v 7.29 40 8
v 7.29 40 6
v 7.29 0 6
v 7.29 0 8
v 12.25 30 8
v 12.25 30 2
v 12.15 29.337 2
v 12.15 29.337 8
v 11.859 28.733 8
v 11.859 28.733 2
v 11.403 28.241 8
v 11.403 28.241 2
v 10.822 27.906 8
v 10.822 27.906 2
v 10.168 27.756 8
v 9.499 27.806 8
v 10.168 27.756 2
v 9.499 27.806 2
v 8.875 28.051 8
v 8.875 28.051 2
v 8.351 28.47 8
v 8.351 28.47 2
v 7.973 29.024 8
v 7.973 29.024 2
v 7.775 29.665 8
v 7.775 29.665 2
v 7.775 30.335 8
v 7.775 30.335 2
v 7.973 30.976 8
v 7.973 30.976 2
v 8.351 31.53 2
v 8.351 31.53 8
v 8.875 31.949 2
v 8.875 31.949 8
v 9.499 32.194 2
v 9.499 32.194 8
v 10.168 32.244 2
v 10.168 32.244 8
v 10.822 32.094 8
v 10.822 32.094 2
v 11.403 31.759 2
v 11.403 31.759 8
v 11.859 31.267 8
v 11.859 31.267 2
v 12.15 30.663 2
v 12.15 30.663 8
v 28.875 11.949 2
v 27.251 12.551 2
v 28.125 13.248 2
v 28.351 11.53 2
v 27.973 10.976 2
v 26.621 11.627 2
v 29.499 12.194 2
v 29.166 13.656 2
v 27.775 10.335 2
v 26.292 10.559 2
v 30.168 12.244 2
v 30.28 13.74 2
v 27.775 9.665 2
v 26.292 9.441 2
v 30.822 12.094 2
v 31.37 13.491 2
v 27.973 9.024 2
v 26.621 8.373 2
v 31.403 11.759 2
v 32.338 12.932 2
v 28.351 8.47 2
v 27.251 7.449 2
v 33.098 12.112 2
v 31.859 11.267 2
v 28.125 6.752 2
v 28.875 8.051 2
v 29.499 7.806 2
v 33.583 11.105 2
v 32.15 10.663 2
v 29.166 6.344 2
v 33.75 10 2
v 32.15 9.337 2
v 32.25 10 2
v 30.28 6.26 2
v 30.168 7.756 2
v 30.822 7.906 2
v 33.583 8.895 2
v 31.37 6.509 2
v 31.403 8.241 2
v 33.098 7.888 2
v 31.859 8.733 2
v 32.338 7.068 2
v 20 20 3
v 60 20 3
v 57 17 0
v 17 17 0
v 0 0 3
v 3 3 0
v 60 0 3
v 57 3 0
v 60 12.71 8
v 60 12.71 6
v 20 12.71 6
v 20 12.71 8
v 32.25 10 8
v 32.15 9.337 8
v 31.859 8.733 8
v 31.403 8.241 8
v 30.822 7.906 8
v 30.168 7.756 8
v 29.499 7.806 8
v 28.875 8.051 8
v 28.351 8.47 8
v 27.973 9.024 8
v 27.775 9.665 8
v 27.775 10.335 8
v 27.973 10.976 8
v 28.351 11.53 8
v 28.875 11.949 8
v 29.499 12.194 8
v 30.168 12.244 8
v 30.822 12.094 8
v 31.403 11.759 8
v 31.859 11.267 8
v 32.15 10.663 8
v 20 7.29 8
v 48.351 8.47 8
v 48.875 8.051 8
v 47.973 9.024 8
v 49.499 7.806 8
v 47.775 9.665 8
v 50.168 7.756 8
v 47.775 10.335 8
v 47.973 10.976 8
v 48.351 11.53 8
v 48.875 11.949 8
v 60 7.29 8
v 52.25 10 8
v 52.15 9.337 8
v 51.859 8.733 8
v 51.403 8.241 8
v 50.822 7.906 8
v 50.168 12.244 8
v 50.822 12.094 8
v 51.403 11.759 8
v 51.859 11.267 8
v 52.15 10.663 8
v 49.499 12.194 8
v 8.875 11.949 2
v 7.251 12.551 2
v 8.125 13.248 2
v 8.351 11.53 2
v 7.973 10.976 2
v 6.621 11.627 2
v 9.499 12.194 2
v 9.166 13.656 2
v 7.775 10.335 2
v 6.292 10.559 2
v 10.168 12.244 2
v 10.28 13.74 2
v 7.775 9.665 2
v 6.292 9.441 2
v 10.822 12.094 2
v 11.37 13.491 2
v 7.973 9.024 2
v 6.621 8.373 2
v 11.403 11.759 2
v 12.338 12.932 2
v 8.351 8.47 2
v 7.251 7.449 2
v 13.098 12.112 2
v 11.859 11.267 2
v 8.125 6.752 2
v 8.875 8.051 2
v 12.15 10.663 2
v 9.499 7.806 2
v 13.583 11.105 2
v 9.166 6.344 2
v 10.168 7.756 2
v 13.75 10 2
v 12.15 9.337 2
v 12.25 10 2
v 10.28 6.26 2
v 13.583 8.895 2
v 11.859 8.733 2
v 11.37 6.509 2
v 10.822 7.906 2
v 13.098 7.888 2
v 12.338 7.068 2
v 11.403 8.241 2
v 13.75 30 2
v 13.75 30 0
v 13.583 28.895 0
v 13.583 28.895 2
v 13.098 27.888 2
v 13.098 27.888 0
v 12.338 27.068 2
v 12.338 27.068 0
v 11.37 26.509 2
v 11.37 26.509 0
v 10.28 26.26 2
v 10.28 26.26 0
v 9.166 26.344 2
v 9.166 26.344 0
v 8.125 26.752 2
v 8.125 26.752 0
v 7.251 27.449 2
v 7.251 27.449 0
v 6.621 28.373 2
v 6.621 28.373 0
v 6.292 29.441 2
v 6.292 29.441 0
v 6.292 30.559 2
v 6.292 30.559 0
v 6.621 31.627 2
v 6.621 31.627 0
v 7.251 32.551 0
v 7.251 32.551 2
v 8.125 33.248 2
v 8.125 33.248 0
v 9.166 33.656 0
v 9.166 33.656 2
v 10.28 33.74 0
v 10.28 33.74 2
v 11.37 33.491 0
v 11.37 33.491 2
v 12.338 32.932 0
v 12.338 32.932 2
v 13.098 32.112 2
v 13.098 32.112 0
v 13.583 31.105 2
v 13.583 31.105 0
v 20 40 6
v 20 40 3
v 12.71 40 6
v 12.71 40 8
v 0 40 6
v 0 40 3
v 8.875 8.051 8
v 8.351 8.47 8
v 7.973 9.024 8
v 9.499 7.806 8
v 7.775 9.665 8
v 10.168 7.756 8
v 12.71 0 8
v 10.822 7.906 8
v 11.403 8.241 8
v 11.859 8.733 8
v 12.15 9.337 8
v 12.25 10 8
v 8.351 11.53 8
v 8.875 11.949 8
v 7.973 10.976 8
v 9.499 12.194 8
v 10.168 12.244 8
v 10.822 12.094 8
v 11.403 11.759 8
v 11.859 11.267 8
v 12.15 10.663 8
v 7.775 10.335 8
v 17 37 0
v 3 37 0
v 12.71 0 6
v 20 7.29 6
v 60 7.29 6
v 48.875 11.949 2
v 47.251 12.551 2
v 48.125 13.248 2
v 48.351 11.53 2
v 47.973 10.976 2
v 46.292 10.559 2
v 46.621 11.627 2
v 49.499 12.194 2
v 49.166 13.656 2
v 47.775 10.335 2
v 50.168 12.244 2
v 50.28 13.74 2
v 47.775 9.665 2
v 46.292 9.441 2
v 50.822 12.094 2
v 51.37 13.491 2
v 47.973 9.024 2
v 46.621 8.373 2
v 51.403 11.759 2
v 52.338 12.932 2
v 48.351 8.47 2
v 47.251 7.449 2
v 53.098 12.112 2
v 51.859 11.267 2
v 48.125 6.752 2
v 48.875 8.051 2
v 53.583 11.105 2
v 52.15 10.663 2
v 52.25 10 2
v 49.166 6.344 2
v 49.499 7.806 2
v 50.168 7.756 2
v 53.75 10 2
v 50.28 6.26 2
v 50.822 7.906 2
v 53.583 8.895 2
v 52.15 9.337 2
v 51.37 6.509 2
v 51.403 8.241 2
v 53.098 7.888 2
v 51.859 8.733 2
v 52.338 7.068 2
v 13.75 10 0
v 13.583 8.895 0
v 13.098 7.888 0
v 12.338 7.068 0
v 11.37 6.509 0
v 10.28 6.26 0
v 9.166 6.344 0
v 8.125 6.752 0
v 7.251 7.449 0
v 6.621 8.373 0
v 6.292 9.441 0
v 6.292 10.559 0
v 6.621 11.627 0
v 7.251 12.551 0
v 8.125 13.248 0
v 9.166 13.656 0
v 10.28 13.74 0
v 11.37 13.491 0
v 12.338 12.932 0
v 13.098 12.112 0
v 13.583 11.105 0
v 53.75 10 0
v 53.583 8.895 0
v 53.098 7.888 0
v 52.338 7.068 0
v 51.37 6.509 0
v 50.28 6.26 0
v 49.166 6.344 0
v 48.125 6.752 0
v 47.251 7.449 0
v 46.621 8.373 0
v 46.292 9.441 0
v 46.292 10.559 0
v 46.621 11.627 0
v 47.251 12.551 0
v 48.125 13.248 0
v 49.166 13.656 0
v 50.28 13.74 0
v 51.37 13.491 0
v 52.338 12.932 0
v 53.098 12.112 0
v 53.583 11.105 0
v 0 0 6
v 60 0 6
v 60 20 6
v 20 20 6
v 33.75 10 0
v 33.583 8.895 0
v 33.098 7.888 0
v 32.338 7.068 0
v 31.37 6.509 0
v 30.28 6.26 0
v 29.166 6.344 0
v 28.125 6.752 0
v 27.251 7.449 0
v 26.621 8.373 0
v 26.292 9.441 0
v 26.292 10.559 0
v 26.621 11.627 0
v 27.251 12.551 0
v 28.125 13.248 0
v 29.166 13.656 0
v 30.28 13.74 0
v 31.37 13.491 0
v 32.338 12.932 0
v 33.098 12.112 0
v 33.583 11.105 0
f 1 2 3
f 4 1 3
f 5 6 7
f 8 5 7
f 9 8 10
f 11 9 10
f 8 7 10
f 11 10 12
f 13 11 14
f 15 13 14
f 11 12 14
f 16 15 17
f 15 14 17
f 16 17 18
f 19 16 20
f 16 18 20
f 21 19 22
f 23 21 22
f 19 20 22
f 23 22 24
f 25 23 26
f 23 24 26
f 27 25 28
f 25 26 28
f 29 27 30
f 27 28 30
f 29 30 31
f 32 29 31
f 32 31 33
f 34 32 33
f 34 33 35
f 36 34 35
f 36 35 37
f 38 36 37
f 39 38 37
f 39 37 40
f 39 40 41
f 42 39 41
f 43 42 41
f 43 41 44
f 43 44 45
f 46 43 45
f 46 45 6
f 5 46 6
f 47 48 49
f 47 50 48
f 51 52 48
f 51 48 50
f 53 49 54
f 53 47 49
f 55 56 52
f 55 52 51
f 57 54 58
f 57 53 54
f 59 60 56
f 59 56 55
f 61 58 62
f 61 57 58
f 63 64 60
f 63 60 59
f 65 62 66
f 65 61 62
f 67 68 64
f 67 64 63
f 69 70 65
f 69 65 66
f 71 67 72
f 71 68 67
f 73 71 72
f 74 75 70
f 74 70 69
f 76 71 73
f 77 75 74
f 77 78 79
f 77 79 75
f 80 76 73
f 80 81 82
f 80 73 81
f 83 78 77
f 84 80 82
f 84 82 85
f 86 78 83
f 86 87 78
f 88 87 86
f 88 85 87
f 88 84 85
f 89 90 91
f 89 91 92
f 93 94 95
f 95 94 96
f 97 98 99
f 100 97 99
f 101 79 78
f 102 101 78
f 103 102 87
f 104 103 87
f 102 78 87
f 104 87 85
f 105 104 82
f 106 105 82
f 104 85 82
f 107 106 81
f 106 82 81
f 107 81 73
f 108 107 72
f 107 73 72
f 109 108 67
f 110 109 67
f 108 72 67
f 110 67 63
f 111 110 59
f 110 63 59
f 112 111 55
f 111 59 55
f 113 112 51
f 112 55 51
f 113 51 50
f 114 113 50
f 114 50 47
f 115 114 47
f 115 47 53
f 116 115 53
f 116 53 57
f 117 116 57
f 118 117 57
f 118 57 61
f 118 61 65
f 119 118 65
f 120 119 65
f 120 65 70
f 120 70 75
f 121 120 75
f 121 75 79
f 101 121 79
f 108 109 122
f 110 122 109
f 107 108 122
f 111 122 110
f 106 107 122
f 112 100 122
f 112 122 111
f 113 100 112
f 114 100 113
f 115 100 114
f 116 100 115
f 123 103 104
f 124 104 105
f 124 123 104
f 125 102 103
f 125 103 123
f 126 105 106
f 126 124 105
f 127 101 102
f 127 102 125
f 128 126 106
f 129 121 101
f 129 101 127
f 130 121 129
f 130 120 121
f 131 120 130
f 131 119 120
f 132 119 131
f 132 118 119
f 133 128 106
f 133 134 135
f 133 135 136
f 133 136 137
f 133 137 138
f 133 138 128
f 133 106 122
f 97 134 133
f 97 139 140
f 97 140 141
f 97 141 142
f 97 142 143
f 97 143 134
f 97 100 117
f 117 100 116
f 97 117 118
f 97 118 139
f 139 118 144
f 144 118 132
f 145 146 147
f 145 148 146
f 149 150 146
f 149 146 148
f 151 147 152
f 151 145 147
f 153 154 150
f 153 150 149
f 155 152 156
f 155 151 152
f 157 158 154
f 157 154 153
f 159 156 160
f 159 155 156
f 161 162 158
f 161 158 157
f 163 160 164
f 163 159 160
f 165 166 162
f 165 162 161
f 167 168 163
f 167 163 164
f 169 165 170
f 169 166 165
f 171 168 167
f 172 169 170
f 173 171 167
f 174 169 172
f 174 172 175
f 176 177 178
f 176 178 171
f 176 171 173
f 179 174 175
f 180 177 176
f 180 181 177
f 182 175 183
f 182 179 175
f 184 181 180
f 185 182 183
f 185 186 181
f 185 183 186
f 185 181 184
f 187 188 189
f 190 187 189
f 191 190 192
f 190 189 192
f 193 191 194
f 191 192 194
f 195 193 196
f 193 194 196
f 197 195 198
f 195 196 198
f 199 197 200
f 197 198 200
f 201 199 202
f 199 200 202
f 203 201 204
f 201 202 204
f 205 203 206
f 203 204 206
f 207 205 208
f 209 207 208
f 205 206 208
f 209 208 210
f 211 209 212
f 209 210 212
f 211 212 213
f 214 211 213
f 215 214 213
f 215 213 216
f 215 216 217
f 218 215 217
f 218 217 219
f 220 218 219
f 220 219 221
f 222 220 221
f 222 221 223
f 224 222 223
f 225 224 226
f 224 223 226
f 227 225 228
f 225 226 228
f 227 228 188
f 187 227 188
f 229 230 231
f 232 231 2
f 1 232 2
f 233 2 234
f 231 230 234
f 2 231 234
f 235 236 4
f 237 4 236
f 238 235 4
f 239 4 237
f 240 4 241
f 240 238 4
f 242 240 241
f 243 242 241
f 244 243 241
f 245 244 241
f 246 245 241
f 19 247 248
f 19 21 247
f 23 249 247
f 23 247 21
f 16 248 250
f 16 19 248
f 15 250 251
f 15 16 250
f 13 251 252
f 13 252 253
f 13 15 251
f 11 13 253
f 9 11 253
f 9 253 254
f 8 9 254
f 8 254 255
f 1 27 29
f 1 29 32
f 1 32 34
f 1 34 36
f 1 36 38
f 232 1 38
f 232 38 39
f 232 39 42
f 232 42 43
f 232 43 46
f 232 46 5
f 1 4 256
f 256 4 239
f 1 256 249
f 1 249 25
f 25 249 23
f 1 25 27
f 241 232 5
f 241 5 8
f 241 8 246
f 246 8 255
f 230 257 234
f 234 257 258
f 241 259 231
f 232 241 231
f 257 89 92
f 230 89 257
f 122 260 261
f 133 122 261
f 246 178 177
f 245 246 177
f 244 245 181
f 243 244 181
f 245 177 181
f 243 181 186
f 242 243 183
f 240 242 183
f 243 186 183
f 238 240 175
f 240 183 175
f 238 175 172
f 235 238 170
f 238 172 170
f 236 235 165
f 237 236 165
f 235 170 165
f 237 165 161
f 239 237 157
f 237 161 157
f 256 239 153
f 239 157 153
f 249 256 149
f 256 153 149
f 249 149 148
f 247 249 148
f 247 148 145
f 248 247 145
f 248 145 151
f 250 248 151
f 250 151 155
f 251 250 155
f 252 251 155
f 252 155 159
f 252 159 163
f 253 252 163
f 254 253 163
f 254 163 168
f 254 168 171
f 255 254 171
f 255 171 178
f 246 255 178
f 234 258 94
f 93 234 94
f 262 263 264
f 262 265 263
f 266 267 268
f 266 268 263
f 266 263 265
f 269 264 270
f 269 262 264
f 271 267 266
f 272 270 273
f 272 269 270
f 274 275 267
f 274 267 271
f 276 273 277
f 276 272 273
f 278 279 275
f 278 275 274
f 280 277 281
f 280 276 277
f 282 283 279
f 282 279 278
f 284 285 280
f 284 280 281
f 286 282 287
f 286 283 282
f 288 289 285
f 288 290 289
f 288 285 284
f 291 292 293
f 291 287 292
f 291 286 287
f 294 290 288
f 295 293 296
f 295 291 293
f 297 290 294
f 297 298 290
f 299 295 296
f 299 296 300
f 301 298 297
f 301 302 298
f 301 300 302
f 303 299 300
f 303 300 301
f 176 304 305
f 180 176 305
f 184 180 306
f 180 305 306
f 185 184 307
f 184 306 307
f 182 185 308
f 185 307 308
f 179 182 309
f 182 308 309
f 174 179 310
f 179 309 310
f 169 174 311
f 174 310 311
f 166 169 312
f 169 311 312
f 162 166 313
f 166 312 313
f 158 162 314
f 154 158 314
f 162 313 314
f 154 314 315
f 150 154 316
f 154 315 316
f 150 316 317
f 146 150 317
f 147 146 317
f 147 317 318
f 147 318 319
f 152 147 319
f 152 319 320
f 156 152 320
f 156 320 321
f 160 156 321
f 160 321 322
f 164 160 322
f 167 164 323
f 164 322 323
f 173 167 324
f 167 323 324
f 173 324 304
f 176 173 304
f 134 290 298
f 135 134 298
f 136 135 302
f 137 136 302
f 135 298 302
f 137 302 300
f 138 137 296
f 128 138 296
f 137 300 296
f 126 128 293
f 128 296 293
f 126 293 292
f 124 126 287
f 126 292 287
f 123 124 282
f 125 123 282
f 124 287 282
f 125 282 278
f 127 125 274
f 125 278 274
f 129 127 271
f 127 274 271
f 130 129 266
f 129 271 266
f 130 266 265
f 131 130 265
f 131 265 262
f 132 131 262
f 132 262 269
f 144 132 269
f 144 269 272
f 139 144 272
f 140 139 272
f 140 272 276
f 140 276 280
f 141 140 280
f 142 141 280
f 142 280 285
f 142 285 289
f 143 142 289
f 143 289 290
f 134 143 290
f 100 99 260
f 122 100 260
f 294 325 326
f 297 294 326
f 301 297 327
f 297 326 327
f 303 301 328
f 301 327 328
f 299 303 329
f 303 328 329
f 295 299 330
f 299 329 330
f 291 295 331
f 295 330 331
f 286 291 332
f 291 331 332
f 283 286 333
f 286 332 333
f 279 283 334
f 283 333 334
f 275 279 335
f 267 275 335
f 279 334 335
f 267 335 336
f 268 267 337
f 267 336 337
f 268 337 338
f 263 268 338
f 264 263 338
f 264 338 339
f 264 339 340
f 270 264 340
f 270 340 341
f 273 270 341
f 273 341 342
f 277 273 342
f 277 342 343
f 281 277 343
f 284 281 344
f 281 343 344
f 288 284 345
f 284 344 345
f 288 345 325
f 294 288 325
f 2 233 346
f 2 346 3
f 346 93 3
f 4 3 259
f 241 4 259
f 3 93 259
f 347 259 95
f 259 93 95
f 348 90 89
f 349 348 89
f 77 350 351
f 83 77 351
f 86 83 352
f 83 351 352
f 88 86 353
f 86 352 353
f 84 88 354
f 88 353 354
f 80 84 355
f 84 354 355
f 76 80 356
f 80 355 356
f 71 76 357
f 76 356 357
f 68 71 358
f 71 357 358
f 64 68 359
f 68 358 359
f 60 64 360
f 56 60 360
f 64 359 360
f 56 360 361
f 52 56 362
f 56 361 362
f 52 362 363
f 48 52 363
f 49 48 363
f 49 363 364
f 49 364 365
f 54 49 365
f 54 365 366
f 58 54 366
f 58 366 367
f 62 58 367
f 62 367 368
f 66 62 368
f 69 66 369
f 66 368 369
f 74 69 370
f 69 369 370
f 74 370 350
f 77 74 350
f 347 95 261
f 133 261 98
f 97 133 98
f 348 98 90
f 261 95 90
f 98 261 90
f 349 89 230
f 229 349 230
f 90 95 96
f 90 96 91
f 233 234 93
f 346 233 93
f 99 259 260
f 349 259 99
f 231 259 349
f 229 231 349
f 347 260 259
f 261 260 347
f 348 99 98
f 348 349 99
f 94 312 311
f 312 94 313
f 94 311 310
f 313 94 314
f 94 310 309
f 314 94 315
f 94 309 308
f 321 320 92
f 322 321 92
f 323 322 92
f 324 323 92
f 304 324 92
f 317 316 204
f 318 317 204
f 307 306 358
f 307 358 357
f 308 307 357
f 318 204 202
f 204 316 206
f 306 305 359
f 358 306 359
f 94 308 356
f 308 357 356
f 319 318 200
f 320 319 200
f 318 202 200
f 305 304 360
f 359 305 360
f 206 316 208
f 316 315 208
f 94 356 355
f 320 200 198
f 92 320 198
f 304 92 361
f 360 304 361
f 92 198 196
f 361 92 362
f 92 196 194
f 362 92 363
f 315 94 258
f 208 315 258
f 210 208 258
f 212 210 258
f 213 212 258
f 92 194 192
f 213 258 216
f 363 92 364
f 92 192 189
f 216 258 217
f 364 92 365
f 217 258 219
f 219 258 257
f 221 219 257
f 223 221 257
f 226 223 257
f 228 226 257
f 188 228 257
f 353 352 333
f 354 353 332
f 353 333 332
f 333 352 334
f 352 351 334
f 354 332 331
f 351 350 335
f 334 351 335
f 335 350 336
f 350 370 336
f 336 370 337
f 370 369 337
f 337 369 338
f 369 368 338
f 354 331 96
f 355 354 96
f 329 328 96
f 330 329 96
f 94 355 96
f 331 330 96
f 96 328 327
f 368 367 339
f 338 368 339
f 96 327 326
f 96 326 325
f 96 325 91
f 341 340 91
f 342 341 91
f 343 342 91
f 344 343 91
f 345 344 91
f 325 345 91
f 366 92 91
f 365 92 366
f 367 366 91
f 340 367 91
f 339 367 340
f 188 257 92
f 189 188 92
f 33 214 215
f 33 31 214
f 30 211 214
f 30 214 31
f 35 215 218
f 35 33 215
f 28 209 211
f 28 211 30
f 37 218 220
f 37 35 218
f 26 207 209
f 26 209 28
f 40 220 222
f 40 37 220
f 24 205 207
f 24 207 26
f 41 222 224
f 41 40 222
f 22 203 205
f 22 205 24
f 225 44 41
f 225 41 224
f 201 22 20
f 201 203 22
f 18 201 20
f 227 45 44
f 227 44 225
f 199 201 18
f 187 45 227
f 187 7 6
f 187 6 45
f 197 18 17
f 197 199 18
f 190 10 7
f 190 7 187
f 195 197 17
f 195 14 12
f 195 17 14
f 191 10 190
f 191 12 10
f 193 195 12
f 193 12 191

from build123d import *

# Parameters (mm, degrees)
F1_DEPTH = 6
F3_DEPTH = 2
F4_R     = 2.25
F5_DEPTH = 8.001
F6_R     = 3.75
F7_DEPTH = 2
F8_SIZE  = 3


with BuildPart() as f1:
    # F0 (on Top) → F1 (new body)
    with BuildSketch(Plane.XY):
        Polygon((0, 40), (0, 0), (60, 0), (60, 20), (20, 20), (20, 40), align=None)
    extrude(amount=F1_DEPTH)

    # F2 (on face) → F3 (join)
    with BuildSketch(Plane.XY.offset(6)):
        Polygon((12.71, 40), (7.29, 40), (7.29, 0), (10, 0), (12.71, 0), align=None)
        Polygon((60, 7.29), (60, 12.71), (20, 12.71), (20, 10), (20, 7.29), align=None)
    extrude(amount=F3_DEPTH)

    # F4 (on face) → F5 (cut, through all)
    with BuildSketch(Plane(origin=(0, 0, 0), x_dir=(1, 0, 0), z_dir=(0, 0, -1))):
        with Locations((10, -10)):
            Circle(F4_R)
        with Locations((50, -10)):
            Circle(F4_R)
        with Locations((10, -30)):
            Circle(F4_R)
        with Locations((30, -10)):
            Circle(F4_R)
    extrude(amount=-F5_DEPTH, mode=Mode.SUBTRACT)

    # F6 (on face) → F7 (cut)
    with BuildSketch(Plane(origin=(0, 0, 0), x_dir=(1, 0, 0), z_dir=(0, 0, -1))):
        with Locations((10, -10)):
            Circle(F6_R)
        with Locations((30, -10)):
            Circle(F6_R)
        with Locations((50, -10)):
            Circle(F6_R)
        with Locations((10, -30)):
            Circle(F6_R)
    extrude(amount=-F7_DEPTH, mode=Mode.SUBTRACT)

    # F8
    f8_edges = [f1.edges().sort_by_distance(p)[0] for p in [
        (30, 0, 0),
        (0, 20, 0),
        (20, 30, 0),
        (40, 20, 0),
        (60, 10, 0),
        (10, 40, 0),
    ]]
    chamfer(f8_edges, length=F8_SIZE)


solid = f1.part
